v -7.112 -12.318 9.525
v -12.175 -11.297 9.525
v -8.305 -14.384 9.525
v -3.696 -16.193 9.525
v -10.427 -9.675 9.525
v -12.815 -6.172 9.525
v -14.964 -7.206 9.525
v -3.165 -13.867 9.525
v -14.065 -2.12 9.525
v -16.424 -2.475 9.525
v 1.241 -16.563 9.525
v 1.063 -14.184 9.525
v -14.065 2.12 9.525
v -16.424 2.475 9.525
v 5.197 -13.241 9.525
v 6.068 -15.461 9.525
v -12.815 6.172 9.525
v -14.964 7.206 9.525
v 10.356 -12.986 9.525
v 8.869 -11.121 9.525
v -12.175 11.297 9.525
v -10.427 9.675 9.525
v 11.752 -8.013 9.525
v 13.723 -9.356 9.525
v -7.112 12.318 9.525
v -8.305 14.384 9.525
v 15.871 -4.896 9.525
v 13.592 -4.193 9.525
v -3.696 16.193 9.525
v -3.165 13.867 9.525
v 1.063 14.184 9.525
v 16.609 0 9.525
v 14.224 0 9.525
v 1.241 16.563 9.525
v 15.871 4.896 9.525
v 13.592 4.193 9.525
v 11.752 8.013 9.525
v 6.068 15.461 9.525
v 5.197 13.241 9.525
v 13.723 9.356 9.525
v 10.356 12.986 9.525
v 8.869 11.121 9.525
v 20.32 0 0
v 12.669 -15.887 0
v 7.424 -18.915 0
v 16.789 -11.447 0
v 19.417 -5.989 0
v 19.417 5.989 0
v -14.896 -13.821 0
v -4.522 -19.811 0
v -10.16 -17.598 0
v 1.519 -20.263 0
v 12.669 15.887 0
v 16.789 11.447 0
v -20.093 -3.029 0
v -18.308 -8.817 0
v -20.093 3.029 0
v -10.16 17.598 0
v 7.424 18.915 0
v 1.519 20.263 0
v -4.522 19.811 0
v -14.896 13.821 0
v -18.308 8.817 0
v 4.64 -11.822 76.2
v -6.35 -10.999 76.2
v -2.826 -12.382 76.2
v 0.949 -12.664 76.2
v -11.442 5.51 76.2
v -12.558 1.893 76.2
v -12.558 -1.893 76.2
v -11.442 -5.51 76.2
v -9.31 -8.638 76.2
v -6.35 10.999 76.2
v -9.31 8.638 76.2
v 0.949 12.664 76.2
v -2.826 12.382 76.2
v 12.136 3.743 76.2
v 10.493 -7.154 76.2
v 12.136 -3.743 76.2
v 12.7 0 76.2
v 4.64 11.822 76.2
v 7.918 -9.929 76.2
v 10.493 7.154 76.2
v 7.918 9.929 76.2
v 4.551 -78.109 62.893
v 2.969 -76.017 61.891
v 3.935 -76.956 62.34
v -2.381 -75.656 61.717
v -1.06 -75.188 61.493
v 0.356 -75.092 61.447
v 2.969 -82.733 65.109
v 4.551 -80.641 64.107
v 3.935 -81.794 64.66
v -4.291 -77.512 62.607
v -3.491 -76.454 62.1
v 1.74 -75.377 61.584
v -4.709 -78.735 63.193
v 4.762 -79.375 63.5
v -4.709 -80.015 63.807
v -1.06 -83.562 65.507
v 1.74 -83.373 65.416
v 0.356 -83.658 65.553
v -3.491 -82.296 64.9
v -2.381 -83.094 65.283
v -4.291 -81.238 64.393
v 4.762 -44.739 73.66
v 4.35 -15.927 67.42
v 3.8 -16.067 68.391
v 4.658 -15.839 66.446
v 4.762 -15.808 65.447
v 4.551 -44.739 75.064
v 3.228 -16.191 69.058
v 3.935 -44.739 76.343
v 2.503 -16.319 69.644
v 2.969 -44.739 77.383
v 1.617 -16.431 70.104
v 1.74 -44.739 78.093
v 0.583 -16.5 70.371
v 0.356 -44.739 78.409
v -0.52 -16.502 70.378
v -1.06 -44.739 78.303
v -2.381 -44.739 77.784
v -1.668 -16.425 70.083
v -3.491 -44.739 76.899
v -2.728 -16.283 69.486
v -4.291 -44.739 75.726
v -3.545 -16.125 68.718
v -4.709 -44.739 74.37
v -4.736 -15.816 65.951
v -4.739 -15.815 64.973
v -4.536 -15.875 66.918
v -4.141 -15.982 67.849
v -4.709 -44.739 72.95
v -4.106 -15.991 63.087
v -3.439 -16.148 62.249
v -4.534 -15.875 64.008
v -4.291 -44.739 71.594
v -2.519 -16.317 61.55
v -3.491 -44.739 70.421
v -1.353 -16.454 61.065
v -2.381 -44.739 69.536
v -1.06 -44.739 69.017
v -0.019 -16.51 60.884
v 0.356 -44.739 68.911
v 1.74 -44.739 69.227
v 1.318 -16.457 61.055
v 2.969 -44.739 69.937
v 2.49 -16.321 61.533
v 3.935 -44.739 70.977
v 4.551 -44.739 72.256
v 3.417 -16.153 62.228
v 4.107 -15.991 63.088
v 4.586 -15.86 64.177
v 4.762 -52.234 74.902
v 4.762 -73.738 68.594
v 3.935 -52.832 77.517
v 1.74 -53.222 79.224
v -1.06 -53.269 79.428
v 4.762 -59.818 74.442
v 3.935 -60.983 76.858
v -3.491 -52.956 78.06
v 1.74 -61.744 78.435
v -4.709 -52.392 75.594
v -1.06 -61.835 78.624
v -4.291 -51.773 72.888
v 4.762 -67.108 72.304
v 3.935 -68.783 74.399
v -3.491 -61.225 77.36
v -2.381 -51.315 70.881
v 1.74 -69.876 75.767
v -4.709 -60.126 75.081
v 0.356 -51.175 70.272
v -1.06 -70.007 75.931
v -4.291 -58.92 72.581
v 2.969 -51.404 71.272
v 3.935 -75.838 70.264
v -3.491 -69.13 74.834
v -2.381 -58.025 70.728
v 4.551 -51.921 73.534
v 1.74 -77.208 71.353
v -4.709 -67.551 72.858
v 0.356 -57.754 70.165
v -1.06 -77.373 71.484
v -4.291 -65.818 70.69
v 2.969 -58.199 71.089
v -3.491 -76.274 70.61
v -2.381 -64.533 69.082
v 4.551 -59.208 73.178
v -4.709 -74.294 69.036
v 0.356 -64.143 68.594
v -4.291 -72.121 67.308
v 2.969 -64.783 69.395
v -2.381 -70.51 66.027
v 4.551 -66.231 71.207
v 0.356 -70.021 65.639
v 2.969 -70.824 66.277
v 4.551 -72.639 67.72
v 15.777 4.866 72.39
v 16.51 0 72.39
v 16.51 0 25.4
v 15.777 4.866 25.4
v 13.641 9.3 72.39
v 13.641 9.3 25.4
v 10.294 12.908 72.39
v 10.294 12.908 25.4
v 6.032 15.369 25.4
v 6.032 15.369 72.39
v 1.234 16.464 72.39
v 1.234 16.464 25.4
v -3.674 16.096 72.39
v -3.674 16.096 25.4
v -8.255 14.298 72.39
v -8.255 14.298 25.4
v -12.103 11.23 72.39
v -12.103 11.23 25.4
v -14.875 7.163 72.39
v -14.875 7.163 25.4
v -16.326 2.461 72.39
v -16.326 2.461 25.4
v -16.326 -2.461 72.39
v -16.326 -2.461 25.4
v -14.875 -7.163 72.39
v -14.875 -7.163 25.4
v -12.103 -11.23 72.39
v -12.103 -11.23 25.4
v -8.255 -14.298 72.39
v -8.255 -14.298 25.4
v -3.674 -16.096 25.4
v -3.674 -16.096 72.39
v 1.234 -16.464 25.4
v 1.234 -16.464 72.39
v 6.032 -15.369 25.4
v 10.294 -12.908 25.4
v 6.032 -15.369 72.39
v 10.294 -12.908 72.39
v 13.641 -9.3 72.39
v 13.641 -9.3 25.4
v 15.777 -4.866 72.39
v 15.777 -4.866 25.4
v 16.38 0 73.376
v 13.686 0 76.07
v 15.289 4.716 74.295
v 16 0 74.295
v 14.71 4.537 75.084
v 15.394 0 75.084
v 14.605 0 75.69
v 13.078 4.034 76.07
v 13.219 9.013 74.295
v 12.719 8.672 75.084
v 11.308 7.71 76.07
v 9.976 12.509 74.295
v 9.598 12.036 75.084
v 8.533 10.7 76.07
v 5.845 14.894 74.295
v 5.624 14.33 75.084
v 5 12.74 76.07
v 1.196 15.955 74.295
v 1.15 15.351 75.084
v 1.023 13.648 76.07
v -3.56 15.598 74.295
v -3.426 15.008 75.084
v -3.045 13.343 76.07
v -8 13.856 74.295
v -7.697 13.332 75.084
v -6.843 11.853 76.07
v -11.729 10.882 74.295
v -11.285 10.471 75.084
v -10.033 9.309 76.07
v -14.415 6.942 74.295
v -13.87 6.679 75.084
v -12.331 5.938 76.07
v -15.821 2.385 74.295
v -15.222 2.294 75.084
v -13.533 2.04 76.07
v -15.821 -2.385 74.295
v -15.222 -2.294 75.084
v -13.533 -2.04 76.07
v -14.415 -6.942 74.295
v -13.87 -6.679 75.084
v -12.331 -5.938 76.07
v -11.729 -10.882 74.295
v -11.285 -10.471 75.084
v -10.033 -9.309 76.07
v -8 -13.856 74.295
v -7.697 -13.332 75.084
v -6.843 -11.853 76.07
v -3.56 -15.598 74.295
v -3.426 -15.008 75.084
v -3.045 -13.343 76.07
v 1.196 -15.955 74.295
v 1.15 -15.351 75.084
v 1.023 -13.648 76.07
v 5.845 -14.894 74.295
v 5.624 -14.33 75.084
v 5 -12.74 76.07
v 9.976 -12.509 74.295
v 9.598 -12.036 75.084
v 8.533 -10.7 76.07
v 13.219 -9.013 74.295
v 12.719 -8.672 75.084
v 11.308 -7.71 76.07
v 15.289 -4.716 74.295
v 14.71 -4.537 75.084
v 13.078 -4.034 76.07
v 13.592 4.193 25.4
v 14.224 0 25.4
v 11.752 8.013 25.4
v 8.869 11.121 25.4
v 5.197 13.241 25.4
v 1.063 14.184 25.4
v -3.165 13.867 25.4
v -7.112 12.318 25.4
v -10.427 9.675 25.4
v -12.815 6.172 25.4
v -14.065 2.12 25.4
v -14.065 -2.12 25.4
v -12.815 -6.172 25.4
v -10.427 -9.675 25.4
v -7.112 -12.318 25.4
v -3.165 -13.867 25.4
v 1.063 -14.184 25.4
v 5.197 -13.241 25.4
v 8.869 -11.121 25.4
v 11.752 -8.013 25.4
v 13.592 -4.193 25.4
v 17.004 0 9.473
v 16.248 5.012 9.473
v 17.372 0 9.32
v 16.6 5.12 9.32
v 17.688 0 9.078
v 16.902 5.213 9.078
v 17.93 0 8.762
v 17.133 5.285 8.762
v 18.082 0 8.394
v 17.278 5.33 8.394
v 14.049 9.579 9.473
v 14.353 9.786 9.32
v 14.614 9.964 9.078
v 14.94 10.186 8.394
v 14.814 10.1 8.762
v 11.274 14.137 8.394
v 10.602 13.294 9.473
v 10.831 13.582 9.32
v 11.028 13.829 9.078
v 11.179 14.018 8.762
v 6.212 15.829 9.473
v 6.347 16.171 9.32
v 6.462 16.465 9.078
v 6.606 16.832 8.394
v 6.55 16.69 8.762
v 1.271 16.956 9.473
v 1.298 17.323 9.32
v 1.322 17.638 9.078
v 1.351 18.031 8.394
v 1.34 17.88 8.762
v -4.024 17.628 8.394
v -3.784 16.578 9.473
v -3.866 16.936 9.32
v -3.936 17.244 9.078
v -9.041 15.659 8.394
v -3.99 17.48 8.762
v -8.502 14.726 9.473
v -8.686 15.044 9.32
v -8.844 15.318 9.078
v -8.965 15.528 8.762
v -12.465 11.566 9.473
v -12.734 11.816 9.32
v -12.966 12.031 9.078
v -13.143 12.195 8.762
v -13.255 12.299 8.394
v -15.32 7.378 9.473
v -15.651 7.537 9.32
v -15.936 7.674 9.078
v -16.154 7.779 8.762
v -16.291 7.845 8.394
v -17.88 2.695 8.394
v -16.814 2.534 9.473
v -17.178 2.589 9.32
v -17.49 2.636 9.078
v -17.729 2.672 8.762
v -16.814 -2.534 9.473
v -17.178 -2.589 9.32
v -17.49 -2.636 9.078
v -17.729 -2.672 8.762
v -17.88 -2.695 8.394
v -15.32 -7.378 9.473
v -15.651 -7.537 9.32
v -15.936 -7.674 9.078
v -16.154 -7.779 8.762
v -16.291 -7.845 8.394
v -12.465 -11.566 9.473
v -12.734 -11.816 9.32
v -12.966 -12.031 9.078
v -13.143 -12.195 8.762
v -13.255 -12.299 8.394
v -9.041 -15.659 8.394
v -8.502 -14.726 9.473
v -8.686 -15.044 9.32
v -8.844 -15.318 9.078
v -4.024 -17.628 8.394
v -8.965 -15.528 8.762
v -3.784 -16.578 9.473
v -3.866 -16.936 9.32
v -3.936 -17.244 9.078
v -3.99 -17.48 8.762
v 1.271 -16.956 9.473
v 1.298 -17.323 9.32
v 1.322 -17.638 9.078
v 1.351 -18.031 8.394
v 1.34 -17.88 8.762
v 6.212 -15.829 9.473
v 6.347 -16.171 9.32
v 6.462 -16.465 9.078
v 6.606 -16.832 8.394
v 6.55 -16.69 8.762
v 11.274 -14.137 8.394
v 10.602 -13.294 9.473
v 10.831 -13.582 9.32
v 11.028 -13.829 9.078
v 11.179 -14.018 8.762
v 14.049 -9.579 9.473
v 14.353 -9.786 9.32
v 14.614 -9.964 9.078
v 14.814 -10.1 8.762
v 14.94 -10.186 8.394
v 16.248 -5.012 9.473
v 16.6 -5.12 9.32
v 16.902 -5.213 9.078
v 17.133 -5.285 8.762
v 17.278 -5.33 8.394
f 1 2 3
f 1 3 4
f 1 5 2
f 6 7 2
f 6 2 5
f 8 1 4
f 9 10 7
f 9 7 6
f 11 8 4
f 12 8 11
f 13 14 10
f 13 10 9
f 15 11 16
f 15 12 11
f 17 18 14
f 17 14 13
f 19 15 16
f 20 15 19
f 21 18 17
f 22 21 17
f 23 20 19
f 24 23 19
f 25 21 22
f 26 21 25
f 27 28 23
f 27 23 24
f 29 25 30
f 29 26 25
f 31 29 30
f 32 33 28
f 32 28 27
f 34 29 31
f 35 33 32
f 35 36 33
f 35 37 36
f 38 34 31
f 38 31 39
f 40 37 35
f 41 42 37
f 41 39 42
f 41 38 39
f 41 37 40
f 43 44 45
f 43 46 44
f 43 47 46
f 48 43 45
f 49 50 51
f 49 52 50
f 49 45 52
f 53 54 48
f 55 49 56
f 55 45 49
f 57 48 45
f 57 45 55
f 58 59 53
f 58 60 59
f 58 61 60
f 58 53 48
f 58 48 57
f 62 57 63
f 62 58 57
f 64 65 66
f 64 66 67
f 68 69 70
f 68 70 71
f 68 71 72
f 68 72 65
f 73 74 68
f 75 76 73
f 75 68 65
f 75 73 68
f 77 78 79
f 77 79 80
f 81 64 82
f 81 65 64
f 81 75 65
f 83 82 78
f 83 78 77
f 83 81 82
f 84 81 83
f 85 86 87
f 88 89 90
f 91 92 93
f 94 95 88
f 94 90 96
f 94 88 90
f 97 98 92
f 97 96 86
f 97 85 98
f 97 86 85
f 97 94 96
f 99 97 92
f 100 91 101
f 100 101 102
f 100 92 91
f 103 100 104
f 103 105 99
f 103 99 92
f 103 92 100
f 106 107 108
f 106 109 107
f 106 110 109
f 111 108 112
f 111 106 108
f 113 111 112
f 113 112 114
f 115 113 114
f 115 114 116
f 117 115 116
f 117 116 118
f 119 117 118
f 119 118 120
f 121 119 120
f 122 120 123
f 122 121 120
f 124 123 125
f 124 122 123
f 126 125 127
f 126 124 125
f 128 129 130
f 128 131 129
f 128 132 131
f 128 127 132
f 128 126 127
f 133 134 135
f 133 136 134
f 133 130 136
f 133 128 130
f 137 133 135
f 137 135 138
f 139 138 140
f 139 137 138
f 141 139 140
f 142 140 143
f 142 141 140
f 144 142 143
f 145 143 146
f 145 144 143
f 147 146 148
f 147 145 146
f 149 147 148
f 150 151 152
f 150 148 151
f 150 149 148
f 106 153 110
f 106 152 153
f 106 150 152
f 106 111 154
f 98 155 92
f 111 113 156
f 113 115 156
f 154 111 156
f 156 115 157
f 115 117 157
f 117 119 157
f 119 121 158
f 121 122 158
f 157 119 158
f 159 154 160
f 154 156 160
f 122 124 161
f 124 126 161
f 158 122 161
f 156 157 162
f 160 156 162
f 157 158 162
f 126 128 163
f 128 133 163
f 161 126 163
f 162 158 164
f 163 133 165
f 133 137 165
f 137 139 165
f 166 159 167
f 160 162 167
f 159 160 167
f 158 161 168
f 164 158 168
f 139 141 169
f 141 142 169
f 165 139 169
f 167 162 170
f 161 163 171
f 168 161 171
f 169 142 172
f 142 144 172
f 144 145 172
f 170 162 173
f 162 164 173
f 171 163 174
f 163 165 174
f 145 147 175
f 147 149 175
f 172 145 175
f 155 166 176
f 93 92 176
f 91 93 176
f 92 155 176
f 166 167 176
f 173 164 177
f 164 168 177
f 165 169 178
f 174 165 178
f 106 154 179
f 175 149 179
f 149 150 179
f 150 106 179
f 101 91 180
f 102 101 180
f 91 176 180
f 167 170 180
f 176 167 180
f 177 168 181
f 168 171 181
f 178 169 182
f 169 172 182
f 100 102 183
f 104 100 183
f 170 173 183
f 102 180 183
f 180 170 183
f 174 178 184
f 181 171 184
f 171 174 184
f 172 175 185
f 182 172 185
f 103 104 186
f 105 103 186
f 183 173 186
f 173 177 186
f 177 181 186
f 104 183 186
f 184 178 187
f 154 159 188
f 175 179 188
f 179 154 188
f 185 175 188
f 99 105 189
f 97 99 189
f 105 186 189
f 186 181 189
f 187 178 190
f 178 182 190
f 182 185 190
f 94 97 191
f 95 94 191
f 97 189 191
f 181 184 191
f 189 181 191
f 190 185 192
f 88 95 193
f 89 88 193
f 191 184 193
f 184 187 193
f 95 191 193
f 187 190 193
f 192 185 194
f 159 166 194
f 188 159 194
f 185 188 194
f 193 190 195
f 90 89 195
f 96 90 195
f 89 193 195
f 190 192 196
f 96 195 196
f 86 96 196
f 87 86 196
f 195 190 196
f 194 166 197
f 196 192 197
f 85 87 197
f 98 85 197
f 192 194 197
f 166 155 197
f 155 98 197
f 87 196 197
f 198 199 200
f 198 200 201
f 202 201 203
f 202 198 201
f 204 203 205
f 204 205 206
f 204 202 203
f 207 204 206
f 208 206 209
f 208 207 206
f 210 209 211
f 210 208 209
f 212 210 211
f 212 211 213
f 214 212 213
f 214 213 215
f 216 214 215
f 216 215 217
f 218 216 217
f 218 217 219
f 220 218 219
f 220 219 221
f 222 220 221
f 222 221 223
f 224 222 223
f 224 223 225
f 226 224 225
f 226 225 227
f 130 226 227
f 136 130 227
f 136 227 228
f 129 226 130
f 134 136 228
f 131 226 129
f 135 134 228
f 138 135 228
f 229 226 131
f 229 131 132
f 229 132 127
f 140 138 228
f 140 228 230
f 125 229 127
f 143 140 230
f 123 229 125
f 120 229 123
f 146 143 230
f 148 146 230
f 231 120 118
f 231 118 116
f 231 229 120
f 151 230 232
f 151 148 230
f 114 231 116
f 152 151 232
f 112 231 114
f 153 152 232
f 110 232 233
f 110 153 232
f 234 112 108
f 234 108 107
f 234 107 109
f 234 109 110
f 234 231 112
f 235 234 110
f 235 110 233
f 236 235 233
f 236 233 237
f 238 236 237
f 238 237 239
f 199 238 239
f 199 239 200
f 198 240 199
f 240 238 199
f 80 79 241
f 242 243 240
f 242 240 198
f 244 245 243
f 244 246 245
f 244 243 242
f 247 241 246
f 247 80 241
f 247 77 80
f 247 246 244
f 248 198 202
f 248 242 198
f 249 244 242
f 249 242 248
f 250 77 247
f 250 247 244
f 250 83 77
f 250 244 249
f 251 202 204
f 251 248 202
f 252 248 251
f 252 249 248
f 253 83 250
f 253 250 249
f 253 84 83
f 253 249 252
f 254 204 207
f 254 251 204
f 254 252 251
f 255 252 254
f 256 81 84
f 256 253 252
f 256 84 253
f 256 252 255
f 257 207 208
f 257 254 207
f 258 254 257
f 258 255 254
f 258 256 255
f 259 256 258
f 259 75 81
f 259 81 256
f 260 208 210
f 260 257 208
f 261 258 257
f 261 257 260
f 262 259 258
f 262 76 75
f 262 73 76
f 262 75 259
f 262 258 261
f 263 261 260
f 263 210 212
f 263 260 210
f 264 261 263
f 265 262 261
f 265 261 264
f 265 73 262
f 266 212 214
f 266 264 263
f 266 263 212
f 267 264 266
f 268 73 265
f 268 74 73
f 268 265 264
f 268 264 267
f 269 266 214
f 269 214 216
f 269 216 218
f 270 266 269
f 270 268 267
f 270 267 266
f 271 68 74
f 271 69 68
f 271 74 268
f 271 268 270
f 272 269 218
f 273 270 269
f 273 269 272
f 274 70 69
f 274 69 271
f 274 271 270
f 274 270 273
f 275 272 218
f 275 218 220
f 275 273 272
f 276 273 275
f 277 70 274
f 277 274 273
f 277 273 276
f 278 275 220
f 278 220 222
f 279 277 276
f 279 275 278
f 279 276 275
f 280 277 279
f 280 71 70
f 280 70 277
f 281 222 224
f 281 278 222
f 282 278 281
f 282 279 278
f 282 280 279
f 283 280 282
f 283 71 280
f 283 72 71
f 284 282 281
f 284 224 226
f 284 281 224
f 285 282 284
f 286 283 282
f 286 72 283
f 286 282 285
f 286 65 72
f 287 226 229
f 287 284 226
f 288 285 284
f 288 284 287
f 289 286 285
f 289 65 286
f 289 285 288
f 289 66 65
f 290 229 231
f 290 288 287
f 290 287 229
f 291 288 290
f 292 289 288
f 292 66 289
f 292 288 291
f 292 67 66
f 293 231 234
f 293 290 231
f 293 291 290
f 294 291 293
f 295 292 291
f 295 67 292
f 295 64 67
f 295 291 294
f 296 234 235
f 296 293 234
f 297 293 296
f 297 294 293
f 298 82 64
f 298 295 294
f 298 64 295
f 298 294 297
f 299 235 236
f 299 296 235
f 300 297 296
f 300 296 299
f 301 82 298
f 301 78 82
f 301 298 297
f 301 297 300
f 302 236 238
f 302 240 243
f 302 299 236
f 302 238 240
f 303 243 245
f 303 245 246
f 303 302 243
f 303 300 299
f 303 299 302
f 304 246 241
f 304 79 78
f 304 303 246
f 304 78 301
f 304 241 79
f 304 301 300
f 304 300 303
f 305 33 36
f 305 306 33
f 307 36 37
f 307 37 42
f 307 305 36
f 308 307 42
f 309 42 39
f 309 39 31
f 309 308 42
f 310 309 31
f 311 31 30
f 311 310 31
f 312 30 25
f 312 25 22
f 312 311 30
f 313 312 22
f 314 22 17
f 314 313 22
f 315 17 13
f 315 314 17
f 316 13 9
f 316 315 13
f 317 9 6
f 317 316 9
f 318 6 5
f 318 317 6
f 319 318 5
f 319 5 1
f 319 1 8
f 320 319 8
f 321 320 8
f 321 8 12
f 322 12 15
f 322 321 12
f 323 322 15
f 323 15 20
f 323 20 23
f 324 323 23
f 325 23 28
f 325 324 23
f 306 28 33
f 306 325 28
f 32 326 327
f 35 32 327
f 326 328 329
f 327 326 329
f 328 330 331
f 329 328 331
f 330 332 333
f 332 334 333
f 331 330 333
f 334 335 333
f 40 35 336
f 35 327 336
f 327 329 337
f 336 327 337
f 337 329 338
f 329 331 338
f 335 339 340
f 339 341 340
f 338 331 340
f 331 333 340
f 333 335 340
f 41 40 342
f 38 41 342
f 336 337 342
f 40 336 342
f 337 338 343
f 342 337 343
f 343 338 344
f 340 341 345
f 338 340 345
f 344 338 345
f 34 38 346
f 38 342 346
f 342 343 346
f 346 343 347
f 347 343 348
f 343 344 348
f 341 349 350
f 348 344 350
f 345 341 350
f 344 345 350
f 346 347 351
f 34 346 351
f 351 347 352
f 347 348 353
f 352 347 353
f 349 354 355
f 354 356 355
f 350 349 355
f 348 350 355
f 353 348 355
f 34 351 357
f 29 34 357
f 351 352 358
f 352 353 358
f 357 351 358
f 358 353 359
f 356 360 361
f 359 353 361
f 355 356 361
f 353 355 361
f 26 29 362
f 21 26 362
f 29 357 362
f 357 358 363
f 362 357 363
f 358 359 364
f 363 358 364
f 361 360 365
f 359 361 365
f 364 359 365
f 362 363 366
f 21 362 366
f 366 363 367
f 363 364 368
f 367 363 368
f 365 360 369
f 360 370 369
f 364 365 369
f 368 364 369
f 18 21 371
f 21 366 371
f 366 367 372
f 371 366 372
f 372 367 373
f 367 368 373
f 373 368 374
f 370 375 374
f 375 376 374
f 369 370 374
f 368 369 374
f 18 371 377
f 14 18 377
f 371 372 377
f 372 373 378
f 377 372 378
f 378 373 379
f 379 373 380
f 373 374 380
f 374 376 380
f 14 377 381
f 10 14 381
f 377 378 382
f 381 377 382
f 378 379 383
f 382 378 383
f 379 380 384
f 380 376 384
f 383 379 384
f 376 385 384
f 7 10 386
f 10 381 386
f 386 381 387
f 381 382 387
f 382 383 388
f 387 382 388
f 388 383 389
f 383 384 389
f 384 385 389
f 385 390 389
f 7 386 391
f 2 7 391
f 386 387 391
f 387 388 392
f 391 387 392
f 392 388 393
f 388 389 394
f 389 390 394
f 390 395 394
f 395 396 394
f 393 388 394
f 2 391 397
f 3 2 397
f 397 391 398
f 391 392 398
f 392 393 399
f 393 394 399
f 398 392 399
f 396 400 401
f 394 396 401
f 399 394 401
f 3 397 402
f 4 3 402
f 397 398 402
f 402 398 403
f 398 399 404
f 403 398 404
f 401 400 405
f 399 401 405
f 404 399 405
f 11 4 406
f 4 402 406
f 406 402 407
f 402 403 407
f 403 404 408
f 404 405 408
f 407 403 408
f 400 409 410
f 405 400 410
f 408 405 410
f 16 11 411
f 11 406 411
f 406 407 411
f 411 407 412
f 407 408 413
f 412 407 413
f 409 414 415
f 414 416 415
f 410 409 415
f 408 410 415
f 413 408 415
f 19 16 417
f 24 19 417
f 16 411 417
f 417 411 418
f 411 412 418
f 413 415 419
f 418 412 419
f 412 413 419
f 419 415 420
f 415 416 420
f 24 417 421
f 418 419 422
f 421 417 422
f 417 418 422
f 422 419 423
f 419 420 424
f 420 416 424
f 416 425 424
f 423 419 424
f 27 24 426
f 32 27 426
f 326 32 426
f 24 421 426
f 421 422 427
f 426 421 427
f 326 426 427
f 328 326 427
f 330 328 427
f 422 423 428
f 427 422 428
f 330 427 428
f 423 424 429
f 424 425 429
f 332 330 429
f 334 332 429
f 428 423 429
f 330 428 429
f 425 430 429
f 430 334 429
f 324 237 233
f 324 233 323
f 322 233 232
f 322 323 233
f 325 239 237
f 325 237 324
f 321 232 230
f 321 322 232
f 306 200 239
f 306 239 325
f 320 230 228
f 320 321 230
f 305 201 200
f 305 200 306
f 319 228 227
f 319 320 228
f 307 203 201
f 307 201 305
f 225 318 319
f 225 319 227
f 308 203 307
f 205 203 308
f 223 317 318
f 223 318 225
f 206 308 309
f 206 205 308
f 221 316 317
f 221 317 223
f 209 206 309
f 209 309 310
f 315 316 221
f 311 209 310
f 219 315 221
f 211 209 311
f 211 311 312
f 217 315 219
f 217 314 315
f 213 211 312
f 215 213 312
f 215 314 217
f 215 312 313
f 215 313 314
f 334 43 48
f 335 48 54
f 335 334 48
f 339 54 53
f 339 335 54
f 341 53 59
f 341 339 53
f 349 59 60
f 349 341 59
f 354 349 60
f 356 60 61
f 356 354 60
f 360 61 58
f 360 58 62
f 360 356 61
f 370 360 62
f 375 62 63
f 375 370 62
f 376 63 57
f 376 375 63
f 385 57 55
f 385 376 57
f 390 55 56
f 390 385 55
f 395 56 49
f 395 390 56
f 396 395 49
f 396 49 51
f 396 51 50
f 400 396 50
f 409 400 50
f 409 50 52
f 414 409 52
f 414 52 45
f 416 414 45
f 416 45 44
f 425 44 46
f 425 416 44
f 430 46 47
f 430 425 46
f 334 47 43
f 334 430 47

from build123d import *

# Parameters (mm, degrees)
F2_R = 3.81
F3_R = 1.524
F5_R = 4.7625


with BuildPart() as f1:
    # F0 (on Front) → F1 (revolve)
    with BuildSketch(Plane.XZ):
        Polygon((0, 76.2), (0, 0), (20.32, 0), (17.78, 9.525), (14.224, 9.525), (14.224, 25.4), (16.51, 25.4), (16.51, 76.2), align=None)
    revolve(axis=Axis((0, 0, 38.1), (0, 0, 1)))

    # F2
    f2_edges = [f1.edges().sort_by_distance(p)[0] for p in [
        (-16.51, 0, 76.2),
    ]]
    fillet(f2_edges, radius=F2_R)

    # F3
    f3_edges = [f1.edges().sort_by_distance(p)[0] for p in [
        (-17.78, 0, 9.525),
    ]]
    fillet(f3_edges, radius=F3_R)

    # F6: sweep along a path in F4
    with BuildLine(Plane.YZ) as f6_path:
        Line((0, 60.96), (-44.7385872582, 73.66))
        ThreePointArc((-44.7385872582, 73.66), (-63.5228620001, 73.5779674415), (-79.375, 63.5))
    # F5 (on Front) → F6 (sweep)
    with BuildSketch(Plane.XZ):
        with Locations((0, 60.96)):
            Circle(F5_R)
    sweep(path=f6_path.line)


solid = f1.part
